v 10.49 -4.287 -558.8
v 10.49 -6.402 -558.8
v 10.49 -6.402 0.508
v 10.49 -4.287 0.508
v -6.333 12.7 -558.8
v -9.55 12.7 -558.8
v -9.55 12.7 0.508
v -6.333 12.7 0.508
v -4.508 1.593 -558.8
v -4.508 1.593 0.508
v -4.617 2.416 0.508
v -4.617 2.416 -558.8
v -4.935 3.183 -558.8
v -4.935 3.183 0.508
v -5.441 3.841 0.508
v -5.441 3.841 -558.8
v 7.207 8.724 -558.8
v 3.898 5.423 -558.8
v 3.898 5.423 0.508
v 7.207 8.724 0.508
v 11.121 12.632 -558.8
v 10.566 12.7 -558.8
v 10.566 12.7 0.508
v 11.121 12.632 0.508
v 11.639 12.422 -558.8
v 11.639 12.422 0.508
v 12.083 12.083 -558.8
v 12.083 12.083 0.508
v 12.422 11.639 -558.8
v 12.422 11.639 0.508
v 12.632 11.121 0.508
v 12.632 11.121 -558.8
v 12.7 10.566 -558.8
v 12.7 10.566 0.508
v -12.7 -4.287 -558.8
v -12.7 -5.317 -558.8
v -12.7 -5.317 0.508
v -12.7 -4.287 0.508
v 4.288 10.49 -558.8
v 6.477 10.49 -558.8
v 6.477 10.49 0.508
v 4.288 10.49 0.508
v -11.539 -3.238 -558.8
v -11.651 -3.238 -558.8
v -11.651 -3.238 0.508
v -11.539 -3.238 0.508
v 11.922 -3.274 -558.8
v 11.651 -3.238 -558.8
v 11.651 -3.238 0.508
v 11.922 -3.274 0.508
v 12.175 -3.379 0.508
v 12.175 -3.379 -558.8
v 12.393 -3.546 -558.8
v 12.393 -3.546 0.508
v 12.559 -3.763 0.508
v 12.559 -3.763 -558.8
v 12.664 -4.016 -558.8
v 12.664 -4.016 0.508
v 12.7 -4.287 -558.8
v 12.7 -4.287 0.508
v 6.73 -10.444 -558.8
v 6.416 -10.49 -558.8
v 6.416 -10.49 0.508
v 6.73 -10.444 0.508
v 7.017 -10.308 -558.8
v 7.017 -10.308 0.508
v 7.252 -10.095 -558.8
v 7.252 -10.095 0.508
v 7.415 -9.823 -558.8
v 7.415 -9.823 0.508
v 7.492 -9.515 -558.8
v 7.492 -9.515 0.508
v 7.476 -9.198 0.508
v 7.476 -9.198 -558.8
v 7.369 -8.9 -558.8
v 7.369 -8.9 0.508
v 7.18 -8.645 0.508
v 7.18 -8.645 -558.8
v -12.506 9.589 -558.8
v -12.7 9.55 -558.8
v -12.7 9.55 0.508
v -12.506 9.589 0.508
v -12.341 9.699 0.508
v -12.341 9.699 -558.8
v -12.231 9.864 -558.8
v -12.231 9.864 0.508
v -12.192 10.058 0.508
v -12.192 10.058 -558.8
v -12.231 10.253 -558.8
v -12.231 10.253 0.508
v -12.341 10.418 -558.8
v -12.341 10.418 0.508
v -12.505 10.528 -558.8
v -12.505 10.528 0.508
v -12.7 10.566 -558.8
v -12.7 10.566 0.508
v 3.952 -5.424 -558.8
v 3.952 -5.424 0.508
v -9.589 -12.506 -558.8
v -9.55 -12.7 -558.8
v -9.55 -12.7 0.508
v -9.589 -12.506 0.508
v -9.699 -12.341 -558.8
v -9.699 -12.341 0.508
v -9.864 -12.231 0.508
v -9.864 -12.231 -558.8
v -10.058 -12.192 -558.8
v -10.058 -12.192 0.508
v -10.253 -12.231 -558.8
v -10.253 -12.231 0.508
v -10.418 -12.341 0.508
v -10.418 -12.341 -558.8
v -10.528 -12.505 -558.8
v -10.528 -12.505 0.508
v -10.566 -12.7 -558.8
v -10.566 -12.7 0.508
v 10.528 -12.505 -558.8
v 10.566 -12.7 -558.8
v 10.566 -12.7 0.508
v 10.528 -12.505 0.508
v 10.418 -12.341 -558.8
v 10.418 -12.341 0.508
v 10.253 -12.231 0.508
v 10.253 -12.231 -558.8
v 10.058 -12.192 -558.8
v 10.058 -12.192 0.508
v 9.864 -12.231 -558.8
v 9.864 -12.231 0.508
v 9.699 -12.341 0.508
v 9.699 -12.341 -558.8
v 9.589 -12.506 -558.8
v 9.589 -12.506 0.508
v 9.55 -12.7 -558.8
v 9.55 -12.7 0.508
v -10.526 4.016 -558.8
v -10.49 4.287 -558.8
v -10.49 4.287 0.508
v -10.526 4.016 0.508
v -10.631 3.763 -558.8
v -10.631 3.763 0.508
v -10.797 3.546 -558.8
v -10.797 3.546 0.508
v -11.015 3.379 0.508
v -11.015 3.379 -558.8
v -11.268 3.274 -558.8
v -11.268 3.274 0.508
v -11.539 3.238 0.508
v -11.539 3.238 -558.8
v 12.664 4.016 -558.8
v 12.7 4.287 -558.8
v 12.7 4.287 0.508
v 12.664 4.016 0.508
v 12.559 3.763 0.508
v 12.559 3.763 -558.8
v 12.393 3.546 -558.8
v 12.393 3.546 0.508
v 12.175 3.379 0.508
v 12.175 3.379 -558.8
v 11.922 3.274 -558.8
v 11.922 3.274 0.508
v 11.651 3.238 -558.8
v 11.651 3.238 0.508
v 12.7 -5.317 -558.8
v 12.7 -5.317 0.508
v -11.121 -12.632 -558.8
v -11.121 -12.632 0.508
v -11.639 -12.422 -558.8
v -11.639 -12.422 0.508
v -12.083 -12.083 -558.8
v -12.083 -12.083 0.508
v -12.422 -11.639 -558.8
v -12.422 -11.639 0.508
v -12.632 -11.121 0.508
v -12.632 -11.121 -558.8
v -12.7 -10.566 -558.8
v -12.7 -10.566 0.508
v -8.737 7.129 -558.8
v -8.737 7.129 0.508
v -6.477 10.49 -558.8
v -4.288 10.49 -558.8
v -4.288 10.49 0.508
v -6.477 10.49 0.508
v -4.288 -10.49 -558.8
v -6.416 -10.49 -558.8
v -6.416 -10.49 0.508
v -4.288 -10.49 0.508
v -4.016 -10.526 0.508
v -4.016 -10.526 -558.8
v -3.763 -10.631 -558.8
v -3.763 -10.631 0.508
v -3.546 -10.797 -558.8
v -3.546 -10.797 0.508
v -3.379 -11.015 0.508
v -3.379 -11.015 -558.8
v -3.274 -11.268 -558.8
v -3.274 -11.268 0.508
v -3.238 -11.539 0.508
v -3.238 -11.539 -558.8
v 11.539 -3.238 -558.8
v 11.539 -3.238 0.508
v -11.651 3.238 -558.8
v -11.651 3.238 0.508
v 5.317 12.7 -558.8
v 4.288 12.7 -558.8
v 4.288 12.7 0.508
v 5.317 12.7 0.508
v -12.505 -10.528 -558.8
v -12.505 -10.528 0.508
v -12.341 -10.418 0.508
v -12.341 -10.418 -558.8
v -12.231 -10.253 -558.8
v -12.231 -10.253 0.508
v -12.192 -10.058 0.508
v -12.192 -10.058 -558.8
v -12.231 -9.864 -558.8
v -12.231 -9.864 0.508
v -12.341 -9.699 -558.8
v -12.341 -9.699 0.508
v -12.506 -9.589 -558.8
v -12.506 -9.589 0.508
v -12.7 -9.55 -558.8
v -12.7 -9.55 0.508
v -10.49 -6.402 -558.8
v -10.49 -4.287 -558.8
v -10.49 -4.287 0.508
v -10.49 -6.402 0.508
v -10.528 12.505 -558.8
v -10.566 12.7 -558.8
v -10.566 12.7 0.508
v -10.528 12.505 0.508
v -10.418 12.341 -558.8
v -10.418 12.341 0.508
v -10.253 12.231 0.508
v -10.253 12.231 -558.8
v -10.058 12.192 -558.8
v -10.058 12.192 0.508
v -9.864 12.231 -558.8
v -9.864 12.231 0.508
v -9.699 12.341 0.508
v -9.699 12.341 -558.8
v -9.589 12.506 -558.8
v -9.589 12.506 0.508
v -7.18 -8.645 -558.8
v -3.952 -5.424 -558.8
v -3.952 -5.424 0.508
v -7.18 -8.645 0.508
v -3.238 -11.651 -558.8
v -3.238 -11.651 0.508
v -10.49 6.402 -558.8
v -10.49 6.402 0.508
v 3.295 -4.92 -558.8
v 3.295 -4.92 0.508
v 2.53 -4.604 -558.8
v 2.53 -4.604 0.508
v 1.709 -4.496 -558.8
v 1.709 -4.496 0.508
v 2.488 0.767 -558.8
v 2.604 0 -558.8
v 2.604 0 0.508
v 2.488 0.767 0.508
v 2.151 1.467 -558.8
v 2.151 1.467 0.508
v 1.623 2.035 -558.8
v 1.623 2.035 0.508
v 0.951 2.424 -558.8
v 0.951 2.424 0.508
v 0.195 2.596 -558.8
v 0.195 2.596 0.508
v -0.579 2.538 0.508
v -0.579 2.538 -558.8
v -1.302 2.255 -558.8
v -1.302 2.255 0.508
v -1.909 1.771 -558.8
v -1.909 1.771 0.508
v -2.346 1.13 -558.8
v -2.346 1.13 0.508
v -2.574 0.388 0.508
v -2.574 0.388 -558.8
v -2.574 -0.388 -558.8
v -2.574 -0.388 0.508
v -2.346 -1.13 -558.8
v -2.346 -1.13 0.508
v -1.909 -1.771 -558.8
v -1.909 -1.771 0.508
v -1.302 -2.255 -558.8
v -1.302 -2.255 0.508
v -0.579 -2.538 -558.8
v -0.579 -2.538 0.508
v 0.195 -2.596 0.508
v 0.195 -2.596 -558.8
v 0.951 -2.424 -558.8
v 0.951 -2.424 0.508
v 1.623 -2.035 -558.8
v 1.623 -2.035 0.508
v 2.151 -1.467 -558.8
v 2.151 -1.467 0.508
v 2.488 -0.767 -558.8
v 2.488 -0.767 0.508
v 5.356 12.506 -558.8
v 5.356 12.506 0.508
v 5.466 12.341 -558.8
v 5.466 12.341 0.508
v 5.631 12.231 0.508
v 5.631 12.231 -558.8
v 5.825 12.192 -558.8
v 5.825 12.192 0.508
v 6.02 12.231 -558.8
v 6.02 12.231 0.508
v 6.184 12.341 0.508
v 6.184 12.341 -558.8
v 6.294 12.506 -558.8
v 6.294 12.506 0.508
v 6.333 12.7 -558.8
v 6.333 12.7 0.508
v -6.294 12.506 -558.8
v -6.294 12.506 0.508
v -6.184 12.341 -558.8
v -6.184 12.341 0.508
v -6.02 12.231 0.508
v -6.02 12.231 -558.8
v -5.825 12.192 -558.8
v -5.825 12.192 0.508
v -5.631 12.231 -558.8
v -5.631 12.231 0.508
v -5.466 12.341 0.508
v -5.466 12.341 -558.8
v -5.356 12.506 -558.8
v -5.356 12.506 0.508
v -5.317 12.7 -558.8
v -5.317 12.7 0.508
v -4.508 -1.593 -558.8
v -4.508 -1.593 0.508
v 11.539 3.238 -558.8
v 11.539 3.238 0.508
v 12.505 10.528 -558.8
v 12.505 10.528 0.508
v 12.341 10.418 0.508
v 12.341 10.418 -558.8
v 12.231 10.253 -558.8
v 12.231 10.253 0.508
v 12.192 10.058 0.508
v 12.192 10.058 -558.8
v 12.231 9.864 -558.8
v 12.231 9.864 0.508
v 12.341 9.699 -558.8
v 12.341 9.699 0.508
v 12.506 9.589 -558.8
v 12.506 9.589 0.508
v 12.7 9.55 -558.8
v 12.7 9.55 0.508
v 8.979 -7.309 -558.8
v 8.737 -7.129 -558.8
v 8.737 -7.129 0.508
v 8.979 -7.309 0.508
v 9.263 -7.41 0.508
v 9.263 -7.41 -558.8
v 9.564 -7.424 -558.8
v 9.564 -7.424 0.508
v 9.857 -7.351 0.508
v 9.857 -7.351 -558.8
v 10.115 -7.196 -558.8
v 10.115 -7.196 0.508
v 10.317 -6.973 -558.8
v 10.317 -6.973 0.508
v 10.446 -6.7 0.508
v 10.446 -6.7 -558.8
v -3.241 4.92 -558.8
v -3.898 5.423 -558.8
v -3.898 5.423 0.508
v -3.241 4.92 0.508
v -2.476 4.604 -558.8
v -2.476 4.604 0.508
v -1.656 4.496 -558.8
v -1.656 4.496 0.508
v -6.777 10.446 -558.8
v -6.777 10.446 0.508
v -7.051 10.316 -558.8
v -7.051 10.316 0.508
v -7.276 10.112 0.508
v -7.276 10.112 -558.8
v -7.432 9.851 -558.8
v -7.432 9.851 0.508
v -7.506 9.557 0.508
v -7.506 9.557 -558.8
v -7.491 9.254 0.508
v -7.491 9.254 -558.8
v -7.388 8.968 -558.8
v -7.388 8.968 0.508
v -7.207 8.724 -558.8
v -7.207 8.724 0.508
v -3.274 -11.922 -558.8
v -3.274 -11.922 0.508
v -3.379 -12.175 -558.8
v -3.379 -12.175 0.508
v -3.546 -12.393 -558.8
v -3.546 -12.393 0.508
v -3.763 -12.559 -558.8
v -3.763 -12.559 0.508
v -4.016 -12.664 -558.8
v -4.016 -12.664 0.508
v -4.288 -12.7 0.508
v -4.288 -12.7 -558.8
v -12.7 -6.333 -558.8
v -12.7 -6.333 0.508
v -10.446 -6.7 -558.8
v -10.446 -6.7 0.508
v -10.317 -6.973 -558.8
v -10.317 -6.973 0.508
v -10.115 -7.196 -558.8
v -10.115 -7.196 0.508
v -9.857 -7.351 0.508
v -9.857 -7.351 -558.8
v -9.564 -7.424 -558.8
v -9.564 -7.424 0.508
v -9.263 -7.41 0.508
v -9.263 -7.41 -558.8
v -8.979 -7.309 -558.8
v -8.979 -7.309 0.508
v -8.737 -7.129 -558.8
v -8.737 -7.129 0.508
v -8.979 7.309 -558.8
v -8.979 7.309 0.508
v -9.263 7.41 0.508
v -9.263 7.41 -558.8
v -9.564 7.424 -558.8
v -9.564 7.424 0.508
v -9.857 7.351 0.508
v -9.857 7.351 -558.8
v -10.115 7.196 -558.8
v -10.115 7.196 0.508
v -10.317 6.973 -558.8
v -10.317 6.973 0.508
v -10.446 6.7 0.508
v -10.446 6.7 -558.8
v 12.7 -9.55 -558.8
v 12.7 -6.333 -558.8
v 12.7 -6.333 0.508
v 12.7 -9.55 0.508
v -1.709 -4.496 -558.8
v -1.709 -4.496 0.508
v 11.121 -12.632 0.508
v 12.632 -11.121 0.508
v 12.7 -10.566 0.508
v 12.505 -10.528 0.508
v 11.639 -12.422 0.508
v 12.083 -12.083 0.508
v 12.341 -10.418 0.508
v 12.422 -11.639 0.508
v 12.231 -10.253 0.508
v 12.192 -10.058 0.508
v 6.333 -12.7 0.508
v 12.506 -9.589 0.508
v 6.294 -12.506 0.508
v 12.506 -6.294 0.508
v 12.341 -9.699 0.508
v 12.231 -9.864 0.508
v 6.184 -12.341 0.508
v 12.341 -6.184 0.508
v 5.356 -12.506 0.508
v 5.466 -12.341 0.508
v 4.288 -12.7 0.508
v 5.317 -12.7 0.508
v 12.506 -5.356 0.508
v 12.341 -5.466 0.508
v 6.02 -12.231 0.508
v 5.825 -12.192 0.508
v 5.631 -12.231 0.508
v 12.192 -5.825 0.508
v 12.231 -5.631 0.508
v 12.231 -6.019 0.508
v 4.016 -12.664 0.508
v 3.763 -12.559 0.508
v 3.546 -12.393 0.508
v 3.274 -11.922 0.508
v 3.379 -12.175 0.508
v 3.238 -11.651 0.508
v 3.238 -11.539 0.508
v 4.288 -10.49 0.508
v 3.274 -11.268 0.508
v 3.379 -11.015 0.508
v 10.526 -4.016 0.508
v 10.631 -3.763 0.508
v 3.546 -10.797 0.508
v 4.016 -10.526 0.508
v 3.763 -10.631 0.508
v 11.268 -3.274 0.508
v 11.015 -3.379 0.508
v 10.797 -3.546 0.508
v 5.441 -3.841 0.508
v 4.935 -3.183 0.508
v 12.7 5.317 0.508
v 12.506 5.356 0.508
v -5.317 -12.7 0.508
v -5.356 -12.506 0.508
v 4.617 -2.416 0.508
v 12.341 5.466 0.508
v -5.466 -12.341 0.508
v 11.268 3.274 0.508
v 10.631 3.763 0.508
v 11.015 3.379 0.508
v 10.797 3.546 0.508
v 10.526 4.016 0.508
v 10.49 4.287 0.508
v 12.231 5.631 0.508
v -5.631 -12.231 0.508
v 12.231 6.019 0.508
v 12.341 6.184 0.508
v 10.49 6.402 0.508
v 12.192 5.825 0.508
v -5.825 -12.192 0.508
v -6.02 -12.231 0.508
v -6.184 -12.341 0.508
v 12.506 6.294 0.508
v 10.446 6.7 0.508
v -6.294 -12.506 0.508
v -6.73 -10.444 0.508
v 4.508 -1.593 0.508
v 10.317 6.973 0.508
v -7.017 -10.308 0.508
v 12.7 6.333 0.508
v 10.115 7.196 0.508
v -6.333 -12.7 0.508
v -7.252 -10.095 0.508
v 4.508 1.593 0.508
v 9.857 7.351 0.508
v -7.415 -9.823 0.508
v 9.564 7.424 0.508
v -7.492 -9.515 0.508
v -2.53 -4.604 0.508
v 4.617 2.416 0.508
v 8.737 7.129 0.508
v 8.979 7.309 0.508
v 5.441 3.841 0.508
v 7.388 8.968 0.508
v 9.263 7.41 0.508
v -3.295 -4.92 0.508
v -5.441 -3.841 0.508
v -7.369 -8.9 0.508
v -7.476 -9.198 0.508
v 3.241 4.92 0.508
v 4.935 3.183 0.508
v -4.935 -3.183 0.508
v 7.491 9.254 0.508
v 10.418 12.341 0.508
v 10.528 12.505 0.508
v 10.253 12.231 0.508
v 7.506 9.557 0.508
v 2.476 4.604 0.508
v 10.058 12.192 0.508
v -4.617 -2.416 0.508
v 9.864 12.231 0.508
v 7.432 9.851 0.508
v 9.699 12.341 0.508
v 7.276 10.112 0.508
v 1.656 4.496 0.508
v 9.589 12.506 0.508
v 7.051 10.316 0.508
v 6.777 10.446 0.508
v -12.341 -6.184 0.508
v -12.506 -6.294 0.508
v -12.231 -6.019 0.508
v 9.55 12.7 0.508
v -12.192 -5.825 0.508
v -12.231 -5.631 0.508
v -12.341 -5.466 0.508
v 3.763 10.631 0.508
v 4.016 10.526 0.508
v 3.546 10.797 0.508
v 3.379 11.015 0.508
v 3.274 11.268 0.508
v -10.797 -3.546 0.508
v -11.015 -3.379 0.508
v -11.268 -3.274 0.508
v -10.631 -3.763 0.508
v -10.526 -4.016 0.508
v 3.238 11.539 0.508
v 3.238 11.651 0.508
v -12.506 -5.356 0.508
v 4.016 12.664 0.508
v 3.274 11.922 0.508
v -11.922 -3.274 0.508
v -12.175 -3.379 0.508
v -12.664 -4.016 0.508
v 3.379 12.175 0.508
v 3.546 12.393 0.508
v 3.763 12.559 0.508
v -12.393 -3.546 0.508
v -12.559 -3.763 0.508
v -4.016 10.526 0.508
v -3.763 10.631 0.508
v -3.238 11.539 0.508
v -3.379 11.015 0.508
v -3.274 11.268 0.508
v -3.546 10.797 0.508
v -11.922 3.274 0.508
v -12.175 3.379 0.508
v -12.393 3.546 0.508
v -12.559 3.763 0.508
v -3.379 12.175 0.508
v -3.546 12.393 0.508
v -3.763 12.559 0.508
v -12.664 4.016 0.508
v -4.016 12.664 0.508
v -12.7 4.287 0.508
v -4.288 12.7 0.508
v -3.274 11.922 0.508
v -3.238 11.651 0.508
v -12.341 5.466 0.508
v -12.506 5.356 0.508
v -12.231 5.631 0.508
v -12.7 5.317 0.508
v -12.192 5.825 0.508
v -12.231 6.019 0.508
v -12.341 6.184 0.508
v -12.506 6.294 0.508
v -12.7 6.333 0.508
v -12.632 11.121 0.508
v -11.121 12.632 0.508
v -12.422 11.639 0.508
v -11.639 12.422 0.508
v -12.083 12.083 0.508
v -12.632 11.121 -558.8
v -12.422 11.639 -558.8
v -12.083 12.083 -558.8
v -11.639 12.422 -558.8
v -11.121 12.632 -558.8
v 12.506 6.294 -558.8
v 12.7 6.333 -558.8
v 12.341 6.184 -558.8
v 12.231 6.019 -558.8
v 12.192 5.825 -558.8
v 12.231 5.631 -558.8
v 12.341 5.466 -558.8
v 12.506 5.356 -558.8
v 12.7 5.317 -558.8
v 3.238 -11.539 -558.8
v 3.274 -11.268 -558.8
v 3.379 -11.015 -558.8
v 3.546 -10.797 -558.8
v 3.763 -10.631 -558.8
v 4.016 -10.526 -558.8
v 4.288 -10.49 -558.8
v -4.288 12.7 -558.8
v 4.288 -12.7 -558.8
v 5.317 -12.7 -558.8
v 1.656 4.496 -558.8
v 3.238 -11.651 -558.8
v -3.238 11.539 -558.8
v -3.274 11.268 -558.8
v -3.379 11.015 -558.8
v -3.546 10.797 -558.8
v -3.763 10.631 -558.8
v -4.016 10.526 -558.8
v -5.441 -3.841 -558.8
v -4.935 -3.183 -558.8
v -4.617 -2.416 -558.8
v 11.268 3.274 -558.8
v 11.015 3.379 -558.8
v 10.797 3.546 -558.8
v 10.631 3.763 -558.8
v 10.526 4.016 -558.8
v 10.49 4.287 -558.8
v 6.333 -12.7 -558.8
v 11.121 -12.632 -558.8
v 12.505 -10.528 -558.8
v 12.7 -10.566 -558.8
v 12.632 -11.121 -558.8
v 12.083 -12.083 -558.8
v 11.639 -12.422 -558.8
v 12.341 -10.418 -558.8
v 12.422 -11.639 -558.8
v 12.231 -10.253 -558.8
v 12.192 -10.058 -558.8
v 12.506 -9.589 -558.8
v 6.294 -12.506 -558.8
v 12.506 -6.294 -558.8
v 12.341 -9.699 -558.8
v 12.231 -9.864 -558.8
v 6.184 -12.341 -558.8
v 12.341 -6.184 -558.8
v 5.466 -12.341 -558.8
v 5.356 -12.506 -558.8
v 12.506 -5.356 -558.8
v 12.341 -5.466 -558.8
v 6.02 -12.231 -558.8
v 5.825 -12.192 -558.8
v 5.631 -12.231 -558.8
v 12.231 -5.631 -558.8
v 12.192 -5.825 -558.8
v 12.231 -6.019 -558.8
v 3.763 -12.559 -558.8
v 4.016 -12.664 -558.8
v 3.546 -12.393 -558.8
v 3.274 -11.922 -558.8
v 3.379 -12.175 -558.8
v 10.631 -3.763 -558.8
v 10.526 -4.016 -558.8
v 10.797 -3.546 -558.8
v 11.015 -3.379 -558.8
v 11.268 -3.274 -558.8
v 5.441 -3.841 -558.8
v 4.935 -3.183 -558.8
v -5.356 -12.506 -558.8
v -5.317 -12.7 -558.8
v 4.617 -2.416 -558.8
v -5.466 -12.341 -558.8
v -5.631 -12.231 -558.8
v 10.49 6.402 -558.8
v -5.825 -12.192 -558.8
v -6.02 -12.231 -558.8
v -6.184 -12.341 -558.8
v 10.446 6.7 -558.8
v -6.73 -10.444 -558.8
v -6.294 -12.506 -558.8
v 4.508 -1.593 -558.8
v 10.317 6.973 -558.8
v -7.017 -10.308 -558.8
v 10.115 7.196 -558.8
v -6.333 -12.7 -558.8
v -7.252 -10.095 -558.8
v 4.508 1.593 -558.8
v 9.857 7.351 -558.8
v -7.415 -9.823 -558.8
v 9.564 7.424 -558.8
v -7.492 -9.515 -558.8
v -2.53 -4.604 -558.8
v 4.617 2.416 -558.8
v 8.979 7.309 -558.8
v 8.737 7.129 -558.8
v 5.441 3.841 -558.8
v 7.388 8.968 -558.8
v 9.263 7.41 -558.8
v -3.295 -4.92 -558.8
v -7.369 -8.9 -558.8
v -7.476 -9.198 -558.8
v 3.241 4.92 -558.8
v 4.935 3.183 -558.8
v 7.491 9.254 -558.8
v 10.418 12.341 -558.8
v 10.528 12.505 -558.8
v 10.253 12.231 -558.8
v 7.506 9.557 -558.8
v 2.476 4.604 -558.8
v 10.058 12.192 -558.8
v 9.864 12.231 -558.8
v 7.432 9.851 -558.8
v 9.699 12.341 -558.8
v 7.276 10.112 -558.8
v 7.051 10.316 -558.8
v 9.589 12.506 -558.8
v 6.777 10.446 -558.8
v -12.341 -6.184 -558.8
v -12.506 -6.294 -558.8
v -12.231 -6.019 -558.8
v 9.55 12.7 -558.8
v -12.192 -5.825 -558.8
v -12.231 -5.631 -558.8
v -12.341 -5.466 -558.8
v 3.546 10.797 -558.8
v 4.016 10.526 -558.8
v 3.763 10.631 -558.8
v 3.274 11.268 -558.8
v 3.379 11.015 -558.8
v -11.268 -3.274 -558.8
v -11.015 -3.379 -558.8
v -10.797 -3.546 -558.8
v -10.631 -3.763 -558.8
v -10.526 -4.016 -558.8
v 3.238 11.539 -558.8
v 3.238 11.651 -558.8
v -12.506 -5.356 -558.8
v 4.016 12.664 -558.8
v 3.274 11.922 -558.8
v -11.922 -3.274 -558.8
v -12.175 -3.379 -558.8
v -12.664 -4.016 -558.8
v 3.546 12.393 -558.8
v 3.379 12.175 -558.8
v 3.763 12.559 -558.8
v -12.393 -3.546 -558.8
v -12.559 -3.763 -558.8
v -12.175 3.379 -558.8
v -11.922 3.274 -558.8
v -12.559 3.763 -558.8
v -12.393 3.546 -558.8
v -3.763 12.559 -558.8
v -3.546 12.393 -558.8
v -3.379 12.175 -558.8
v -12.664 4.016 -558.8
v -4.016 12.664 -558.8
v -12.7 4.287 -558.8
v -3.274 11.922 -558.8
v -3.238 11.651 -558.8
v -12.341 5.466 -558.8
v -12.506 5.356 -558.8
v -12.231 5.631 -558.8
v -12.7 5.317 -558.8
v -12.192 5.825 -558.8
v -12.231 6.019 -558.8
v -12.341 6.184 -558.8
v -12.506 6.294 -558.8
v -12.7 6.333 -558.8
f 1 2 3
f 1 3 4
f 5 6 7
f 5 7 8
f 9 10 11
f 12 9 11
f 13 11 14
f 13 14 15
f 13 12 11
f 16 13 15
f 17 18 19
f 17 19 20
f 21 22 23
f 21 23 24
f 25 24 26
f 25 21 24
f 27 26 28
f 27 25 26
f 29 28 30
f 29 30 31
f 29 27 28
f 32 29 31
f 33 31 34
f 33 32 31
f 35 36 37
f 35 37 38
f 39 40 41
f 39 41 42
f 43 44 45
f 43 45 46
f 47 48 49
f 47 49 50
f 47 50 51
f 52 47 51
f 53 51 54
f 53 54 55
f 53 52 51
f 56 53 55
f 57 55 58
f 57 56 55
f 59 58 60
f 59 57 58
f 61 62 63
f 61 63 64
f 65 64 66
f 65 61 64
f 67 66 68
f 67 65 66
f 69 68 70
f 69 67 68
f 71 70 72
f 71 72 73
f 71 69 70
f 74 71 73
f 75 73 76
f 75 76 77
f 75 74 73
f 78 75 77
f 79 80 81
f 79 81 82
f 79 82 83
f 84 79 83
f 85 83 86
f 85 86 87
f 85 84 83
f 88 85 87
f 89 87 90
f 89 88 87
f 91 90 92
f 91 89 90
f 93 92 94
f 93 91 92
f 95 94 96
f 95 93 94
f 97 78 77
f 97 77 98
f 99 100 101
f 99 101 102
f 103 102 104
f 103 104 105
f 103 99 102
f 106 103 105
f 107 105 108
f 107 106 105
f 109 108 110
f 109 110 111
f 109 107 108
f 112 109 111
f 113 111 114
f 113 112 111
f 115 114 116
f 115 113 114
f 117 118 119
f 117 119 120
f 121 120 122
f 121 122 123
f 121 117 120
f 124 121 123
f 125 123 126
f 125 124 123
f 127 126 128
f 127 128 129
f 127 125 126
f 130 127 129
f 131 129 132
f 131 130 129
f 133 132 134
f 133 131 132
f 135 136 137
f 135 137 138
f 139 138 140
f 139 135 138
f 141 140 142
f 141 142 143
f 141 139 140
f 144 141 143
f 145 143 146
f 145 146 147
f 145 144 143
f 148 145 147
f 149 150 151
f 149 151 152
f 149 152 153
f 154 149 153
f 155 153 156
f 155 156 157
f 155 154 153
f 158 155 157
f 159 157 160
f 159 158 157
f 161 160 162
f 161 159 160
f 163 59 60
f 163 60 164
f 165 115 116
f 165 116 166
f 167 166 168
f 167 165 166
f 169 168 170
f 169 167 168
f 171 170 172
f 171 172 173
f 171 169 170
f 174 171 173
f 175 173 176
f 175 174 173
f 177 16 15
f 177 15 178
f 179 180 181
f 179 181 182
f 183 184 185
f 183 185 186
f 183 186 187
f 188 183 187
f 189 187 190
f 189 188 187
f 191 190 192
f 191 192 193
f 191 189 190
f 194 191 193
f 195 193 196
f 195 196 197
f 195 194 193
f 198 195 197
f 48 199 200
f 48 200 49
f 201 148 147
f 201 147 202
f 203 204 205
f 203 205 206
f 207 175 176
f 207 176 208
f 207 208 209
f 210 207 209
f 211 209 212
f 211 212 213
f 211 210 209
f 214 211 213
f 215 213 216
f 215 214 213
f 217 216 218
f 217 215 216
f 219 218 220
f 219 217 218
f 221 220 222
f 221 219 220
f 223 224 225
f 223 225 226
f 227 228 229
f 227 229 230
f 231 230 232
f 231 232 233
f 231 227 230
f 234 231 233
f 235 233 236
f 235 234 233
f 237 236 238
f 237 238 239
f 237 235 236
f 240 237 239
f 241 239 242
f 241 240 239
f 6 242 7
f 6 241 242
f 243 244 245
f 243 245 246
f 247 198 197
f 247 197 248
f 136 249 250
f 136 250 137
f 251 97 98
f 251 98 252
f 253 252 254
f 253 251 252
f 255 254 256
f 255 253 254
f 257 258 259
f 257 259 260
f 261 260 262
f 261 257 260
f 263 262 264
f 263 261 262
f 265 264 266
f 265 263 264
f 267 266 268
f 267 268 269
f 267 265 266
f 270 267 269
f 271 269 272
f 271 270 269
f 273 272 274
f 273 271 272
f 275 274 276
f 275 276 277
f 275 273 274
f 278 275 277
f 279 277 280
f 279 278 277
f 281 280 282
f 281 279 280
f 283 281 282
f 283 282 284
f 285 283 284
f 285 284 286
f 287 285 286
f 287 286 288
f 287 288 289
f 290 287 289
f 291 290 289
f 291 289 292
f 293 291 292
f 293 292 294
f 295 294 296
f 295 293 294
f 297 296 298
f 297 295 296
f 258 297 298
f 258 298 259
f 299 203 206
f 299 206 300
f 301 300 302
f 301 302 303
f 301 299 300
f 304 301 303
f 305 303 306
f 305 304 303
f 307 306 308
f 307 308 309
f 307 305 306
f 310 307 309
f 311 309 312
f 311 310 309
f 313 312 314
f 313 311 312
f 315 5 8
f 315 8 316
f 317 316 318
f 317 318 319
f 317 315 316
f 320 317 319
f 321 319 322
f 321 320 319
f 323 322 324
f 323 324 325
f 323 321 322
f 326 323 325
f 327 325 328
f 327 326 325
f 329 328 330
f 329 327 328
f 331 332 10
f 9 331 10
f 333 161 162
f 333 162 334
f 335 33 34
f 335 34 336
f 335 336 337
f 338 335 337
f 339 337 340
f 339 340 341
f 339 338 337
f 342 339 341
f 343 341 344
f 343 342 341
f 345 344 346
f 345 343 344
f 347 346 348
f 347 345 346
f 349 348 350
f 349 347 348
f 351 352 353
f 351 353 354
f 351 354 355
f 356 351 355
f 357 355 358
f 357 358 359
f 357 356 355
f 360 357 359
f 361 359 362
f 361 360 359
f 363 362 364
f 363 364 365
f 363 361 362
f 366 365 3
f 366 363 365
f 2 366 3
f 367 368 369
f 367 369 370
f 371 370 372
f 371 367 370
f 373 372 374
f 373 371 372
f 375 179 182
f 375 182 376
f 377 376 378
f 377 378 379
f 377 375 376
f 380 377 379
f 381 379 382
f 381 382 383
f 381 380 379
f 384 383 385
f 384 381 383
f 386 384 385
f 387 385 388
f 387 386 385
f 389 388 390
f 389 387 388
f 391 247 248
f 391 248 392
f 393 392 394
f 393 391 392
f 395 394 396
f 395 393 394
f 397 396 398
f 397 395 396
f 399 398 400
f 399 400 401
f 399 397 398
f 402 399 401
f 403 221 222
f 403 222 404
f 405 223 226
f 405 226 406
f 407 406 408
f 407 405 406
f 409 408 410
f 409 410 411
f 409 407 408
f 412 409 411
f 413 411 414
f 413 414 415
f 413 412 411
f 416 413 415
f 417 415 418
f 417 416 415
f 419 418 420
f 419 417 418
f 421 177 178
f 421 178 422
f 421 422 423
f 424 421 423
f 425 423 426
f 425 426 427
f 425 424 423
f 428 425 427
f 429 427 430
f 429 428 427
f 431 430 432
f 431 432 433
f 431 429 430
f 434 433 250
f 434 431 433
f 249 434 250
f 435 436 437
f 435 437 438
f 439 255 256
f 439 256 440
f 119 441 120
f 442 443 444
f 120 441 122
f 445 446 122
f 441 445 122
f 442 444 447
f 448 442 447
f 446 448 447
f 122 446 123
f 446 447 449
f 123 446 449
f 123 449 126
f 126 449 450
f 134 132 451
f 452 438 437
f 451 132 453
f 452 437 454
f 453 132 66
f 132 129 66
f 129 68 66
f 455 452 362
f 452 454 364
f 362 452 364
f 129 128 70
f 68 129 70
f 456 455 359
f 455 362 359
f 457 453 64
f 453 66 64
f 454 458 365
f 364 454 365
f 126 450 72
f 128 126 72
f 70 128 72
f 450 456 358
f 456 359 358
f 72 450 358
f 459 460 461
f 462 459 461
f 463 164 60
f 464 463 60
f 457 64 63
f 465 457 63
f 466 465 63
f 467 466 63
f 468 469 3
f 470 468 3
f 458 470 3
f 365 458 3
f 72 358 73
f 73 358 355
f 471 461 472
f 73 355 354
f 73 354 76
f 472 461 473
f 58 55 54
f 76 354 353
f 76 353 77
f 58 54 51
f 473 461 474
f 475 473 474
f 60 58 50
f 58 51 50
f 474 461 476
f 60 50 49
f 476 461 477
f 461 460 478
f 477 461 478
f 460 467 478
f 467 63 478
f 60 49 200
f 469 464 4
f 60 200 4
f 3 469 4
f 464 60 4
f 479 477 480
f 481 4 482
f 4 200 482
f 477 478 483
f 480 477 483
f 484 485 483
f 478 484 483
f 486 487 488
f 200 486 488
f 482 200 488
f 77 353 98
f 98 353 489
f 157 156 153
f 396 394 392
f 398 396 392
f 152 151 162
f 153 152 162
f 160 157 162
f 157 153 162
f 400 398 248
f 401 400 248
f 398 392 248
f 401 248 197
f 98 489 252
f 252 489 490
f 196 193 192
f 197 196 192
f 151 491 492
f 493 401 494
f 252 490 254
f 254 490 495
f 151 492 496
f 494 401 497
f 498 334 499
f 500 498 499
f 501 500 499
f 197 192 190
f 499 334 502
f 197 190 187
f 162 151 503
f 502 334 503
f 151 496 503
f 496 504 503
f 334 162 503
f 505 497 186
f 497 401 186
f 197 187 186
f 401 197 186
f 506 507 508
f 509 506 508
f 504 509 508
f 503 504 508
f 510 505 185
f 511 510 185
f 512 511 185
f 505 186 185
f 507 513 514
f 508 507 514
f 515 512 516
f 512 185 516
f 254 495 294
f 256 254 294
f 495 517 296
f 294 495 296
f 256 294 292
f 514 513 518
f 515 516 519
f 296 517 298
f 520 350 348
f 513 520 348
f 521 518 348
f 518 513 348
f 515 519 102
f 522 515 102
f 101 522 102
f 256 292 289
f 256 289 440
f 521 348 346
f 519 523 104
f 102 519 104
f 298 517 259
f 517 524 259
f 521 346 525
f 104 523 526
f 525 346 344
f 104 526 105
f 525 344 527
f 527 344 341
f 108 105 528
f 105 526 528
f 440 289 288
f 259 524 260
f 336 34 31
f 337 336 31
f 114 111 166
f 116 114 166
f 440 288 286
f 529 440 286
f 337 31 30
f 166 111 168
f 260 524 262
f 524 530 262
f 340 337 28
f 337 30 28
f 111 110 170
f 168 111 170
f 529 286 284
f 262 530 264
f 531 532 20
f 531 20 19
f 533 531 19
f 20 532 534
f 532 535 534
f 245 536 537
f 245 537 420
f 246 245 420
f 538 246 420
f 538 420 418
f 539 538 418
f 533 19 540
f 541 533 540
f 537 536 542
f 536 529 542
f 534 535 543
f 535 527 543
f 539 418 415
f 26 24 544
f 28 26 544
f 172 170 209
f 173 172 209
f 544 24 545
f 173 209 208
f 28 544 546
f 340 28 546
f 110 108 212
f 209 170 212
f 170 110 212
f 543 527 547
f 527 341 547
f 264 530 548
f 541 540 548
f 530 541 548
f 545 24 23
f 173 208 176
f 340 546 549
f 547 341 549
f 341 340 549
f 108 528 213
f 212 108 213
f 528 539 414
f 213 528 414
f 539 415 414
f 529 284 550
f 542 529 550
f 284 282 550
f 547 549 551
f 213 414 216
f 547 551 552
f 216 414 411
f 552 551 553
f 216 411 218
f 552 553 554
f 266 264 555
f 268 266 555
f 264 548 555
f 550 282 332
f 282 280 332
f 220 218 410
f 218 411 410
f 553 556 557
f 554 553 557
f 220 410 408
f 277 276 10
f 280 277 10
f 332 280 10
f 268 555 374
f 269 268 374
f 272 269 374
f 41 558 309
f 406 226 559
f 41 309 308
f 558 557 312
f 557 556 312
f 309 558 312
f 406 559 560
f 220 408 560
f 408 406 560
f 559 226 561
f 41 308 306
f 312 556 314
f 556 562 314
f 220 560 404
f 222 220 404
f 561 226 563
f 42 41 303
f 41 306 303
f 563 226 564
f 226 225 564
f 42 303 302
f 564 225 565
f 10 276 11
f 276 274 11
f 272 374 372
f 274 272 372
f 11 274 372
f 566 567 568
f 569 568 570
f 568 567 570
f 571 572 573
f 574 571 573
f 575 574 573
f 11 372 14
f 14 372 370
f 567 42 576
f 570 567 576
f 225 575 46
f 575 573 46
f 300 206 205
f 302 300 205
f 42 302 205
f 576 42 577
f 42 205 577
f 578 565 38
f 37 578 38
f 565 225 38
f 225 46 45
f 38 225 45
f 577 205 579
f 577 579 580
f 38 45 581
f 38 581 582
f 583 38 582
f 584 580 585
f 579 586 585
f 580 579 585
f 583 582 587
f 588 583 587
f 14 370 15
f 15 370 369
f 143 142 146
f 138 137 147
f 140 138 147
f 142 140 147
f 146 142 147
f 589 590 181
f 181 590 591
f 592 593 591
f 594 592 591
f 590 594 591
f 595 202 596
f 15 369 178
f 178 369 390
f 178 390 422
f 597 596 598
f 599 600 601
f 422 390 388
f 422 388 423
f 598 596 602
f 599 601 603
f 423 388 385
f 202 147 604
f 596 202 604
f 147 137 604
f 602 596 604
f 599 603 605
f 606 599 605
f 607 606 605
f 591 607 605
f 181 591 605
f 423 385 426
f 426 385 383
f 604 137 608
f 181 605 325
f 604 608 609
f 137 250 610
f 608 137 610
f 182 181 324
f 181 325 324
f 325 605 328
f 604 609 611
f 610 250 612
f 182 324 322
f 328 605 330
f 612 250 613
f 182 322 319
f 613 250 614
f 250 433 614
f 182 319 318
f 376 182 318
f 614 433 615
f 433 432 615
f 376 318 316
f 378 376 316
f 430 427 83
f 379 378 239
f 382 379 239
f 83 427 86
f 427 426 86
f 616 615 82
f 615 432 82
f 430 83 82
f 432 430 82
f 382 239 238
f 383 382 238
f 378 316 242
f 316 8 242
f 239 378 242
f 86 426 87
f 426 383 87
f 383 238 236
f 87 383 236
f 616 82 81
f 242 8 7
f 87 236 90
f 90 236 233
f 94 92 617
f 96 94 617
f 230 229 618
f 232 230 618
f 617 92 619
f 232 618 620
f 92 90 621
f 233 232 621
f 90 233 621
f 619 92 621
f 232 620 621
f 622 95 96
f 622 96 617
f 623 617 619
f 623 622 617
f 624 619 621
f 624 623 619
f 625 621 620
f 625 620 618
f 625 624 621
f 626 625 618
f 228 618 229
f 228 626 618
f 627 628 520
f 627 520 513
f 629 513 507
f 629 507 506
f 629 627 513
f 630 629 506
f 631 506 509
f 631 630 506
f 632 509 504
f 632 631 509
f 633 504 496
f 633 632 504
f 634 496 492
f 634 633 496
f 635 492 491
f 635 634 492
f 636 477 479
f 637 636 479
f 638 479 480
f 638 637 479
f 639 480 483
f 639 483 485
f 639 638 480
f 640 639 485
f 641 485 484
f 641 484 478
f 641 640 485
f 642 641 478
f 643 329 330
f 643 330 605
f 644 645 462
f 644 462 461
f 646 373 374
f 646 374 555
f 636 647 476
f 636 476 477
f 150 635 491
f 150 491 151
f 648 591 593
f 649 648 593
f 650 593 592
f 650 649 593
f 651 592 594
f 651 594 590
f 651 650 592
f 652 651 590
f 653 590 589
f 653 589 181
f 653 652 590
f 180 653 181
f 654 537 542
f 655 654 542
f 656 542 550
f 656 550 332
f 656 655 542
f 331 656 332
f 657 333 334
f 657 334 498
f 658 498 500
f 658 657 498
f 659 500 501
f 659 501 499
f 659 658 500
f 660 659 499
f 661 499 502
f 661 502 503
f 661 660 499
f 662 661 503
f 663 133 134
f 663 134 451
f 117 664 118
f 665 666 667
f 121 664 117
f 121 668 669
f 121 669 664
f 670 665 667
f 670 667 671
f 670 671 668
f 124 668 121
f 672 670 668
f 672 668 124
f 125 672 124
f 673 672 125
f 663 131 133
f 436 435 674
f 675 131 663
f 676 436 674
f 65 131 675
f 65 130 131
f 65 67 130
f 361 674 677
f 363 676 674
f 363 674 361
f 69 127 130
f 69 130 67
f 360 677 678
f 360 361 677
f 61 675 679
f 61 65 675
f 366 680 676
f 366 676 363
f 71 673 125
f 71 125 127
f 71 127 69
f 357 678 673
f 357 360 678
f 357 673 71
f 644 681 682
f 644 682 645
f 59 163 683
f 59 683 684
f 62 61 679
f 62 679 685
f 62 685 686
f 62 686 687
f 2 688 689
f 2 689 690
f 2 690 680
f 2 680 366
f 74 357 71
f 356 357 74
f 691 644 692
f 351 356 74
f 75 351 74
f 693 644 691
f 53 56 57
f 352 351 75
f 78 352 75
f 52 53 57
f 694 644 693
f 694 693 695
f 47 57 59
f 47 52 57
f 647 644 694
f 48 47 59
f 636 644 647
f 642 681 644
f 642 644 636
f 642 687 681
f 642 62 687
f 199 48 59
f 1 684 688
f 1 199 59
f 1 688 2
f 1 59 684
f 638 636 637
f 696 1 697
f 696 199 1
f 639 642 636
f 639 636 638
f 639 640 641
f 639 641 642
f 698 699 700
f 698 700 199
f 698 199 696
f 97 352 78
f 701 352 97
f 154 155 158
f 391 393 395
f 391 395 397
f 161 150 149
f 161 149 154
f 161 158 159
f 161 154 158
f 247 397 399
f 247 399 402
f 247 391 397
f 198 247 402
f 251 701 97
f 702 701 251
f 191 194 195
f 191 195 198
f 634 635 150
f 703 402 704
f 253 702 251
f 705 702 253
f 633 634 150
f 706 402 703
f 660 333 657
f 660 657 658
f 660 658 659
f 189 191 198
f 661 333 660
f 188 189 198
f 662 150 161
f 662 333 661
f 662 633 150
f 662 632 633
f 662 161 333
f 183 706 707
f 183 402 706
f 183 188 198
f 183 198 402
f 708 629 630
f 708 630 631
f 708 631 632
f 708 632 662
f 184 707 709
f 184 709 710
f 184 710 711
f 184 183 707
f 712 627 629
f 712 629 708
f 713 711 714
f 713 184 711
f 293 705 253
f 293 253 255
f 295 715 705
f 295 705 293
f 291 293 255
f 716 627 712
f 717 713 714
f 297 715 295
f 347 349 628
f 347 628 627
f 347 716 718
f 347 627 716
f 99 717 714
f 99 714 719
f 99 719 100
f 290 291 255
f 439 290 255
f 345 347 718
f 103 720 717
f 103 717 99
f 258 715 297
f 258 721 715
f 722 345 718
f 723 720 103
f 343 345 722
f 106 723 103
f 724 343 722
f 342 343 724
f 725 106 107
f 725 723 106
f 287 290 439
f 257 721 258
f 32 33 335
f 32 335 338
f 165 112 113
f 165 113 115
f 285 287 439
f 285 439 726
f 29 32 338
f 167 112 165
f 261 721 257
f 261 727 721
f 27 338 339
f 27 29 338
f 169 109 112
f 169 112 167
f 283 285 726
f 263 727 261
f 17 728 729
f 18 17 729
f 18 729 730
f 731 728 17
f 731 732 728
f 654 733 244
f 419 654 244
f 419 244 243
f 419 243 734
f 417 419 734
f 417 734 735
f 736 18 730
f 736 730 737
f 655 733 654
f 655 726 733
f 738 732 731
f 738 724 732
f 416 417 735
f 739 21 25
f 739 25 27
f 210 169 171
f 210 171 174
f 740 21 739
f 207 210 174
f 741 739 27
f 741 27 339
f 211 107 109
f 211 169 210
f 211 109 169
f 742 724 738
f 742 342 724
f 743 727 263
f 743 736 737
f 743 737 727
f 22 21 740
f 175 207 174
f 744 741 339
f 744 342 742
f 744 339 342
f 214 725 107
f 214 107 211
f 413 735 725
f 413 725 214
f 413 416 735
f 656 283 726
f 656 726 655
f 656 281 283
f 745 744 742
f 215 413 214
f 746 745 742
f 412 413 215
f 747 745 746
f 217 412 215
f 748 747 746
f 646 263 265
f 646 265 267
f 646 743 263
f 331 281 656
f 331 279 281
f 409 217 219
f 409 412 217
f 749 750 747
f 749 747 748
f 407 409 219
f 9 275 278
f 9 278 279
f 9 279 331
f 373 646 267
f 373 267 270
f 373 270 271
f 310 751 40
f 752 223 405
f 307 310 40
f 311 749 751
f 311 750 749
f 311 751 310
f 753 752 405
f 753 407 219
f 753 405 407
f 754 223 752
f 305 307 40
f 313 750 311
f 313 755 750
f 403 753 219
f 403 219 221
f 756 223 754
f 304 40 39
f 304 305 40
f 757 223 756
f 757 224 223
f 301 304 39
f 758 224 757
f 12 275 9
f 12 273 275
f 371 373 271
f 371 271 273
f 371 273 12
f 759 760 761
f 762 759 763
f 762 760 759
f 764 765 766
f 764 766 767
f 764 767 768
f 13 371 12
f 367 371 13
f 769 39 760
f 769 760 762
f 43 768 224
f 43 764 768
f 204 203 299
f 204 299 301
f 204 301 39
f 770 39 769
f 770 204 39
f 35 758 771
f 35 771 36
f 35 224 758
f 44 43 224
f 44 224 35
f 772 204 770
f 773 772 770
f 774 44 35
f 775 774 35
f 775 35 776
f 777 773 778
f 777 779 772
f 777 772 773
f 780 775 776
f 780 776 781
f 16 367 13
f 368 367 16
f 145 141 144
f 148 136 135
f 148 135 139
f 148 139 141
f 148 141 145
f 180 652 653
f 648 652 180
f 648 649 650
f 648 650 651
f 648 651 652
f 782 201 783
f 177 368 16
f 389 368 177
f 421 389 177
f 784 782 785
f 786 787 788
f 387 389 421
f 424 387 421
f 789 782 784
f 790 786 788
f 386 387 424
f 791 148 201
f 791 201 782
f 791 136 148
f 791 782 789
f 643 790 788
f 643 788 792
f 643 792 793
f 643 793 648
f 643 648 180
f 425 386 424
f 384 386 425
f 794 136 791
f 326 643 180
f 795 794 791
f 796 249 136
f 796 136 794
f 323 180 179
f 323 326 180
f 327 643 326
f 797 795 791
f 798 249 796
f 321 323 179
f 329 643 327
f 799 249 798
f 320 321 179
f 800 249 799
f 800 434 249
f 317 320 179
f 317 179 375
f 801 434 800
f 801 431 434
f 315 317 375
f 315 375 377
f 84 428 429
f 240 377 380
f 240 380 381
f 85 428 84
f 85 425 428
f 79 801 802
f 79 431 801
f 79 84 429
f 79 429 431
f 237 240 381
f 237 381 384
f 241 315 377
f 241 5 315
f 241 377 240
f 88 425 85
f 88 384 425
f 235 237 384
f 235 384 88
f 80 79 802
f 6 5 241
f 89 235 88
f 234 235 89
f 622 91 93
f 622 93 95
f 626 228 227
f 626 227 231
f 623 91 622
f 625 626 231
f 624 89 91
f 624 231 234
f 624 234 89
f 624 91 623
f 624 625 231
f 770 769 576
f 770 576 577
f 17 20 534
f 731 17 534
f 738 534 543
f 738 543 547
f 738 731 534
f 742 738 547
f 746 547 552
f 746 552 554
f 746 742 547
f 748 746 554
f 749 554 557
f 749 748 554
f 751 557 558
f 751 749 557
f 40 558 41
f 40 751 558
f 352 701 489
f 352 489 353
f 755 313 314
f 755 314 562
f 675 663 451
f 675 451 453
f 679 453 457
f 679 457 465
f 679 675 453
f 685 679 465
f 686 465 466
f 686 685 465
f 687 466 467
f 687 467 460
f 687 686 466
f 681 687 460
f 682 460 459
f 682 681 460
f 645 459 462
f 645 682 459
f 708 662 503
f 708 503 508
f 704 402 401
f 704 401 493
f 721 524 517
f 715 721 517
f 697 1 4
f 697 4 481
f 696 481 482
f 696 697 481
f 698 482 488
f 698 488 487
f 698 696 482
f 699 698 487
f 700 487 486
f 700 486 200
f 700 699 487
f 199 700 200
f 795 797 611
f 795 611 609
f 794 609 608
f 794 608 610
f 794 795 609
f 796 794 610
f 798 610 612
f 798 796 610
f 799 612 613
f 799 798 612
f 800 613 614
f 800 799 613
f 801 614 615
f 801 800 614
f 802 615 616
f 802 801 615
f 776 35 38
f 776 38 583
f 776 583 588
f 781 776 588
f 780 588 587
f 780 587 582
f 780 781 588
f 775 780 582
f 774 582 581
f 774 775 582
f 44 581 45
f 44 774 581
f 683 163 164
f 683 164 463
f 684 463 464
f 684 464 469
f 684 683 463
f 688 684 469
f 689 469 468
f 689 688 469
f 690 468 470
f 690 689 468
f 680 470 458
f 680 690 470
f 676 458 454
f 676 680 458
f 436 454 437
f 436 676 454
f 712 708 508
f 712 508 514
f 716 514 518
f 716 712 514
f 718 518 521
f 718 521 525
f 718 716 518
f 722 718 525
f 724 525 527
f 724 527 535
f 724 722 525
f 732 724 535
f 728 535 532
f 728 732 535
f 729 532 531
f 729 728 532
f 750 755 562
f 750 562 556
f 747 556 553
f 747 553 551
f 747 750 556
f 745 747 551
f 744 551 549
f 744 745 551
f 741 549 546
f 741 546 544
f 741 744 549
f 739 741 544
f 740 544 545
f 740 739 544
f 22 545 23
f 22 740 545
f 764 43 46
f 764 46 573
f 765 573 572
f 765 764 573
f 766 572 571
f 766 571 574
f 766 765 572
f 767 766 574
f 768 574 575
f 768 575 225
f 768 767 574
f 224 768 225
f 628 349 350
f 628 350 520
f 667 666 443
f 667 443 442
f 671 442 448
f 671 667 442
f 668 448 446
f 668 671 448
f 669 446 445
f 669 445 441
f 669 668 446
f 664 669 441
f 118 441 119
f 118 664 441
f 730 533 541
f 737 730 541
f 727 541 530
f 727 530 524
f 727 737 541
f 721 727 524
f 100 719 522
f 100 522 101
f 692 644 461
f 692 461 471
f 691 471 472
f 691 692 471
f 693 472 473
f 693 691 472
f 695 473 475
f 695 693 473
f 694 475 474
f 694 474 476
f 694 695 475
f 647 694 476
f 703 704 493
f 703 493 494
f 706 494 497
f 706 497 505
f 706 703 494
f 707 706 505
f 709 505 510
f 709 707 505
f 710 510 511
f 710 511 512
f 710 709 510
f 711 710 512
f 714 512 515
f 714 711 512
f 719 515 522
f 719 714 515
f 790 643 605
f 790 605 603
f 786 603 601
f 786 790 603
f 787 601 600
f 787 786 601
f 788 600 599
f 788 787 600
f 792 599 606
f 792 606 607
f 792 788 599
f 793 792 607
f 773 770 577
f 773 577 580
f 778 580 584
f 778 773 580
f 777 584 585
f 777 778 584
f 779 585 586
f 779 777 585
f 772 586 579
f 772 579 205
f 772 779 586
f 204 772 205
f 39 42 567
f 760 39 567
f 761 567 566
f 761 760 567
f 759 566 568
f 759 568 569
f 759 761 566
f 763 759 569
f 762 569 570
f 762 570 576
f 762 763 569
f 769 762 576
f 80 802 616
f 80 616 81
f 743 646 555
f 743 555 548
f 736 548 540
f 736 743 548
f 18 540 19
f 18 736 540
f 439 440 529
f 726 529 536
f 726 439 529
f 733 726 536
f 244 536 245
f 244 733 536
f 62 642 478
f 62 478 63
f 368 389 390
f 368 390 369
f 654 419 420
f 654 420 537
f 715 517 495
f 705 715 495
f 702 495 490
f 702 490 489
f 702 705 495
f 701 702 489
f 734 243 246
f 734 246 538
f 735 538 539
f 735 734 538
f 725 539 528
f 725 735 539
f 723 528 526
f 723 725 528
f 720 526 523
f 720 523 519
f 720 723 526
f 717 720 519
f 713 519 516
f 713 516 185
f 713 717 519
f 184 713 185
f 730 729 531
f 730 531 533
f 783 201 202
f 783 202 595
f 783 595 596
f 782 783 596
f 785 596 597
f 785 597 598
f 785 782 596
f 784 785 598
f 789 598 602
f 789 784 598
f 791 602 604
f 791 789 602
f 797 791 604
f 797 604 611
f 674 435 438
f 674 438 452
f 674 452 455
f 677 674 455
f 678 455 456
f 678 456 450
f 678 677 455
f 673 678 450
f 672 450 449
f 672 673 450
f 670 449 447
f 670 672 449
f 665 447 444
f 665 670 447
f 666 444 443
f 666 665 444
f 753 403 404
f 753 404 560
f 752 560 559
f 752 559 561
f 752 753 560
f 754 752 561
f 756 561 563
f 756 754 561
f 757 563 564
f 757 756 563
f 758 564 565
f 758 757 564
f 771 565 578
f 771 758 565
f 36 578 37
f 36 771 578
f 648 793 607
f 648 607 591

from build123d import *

# Parameters (mm, degrees)
EXTRUDE1_DEPTH      = 0.508
EXTRUDE1_DEPTH_BACK = 558.8
SKETCH1_R           = 2.6035


with BuildPart() as part:
    # Sketch1 → Extrude1 (new, two sides: drawn at the far end of the back side and taken through both)
    with BuildSketch(Plane.XY.offset(-EXTRUDE1_DEPTH_BACK)):
        with BuildLine():
            Line((-7.207036008, 8.724370562), (-3.898272566, 5.423169045))
            ThreePointArc((-3.898272566, 5.423169045), (-2.869120213, 4.736787962), (-1.655778399, 4.4958))
            Line((-1.655778399, 4.4958), (1.655778399, 4.4958))
            ThreePointArc((1.655778399, 4.4958), (2.869120213, 4.736787962), (3.898272566, 5.423169045))
            Line((3.898272566, 5.423169045), (7.207036008, 8.724370562))
            ThreePointArc((7.207036008, 8.724370562), (7.432222385, 9.85140422), (6.476788598, 10.4902))
            Line((6.476788598, 10.4902), (4.287512407, 10.4902))
            ThreePointArc((4.287512407, 10.4902), (3.54574862, 10.79744862), (3.2385, 11.539212407))
            Line((3.2385, 11.539212407), (3.2385, 11.650987593))
            ThreePointArc((3.2385, 11.650987593), (3.54574862, 12.39275138), (4.287512407, 12.7))
            Line((4.287512407, 12.7), (5.317126718, 12.7))
            ThreePointArc((5.317126718, 12.7), (5.825126718, 12.192), (6.333126718, 12.7))
            Line((6.333126718, 12.7), (9.550443118, 12.7))
            ThreePointArc((9.550443118, 12.7), (10.058366869, 12.192000006), (10.566443095, 12.699847501))
            ThreePointArc((10.566443095, 12.699847501), (12.082537762, 12.08250727), (12.699846982, 10.566399977))
            ThreePointArc((12.699846982, 10.566399977), (12.192000006, 10.058323491), (12.7, 9.5504))
            Line((12.7, 9.5504), (12.7, 6.3330836))
            ThreePointArc((12.7, 6.3330836), (12.192, 5.8250836), (12.7, 5.3170836))
            Line((12.7, 5.3170836), (12.7, 4.287469289))
            ThreePointArc((12.7, 4.287469289), (12.39275138, 3.545705502), (11.650987593, 3.238456882))
            Line((11.650987593, 3.238456882), (11.539212407, 3.238456882))
            ThreePointArc((11.539212407, 3.238456882), (10.79744862, 3.545705502), (10.4902, 4.287469289))
            Line((10.4902, 4.287469289), (10.4902, 6.402089023))
            ThreePointArc((10.4902, 6.402089023), (9.856505071, 7.351067942), (8.737131347, 7.129408934))
            Line((8.737131347, 7.129408934), (5.441005833, 3.840816462))
            ThreePointArc((5.441005833, 3.840816462), (4.750877967, 2.809883091), (4.5085, 1.593185507))
            Line((4.5085, 1.593185507), (4.5085, -1.593185507))
            ThreePointArc((4.5085, -1.593185507), (4.750877967, -2.809883091), (5.441005833, -3.840816462))
            Line((5.441005833, -3.840816462), (8.737131347, -7.129408934))
            ThreePointArc((8.737131347, -7.129408934), (9.856505071, -7.351067942), (10.4902, -6.402089023))
            Line((10.4902, -6.402089023), (10.4902, -4.287469289))
            ThreePointArc((10.4902, -4.287469289), (10.79744862, -3.545705502), (11.539212407, -3.238456882))
            Line((11.539212407, -3.238456882), (11.650987593, -3.238456882))
            ThreePointArc((11.650987593, -3.238456882), (12.39275138, -3.545705502), (12.7, -4.287469289))
            Line((12.7, -4.287469289), (12.7, -5.3170836))
            ThreePointArc((12.7, -5.3170836), (12.192, -5.8250836), (12.7, -6.3330836))
            Line((12.7, -6.3330836), (12.7, -9.5504))
            ThreePointArc((12.7, -9.5504), (12.192000006, -10.058323491), (12.699846982, -10.566399977))
            ThreePointArc((12.699846982, -10.566399977), (12.082537762, -12.08250727), (10.566443095, -12.699847501))
            ThreePointArc((10.566443095, -12.699847501), (10.058366869, -12.192000006), (9.550443118, -12.7))
            Line((9.550443118, -12.7), (6.333126718, -12.7))
            ThreePointArc((6.333126718, -12.7), (5.825126718, -12.192), (5.317126718, -12.7))
            Line((5.317126718, -12.7), (4.287512407, -12.7))
            ThreePointArc((4.287512407, -12.7), (3.54574862, -12.39275138), (3.2385, -11.650987593))
            Line((3.2385, -11.650987593), (3.2385, -11.539212407))
            ThreePointArc((3.2385, -11.539212407), (3.54574862, -10.79744862), (4.287512407, -10.4902))
            Line((4.287512407, -10.4902), (6.416408329, -10.4902))
            ThreePointArc((6.416408329, -10.4902), (7.41473083, -9.822813117), (7.179650497, -8.645192506))
            Line((7.179650497, -8.645192506), (3.952270251, -5.423690499))
            ThreePointArc((3.952270251, -5.423690499), (2.922936451, -4.736929036), (1.709253557, -4.4958))
            Line((1.709253557, -4.4958), (-1.709253557, -4.4958))
            ThreePointArc((-1.709253557, -4.4958), (-2.922936451, -4.736929036), (-3.952270251, -5.423690499))
            Line((-3.952270251, -5.423690499), (-7.179650497, -8.645192506))
            ThreePointArc((-7.179650497, -8.645192506), (-7.41473083, -9.822813117), (-6.416408329, -10.4902))
            Line((-6.416408329, -10.4902), (-4.287512407, -10.4902))
            ThreePointArc((-4.287512407, -10.4902), (-3.54574862, -10.79744862), (-3.2385, -11.539212407))
            Line((-3.2385, -11.539212407), (-3.2385, -11.650987593))
            ThreePointArc((-3.2385, -11.650987593), (-3.54574862, -12.39275138), (-4.287512407, -12.7))
            Line((-4.287512407, -12.7), (-5.317126718, -12.7))
            ThreePointArc((-5.317126718, -12.7), (-5.825126718, -12.192), (-6.333126718, -12.7))
            Line((-6.333126718, -12.7), (-9.550443118, -12.7))
            ThreePointArc((-9.550443118, -12.7), (-10.058366869, -12.192000006), (-10.566443095, -12.699847501))
            ThreePointArc((-10.566443095, -12.699847501), (-12.082537762, -12.08250727), (-12.699846982, -10.566399977))
            ThreePointArc((-12.699846982, -10.566399977), (-12.192000006, -10.058323491), (-12.7, -9.5504))
            Line((-12.7, -9.5504), (-12.7, -6.3330836))
            ThreePointArc((-12.7, -6.3330836), (-12.192, -5.8250836), (-12.7, -5.3170836))
            Line((-12.7, -5.3170836), (-12.7, -4.287469289))
            ThreePointArc((-12.7, -4.287469289), (-12.39275138, -3.545705502), (-11.650987593, -3.238456882))
            Line((-11.650987593, -3.238456882), (-11.539212407, -3.238456882))
            ThreePointArc((-11.539212407, -3.238456882), (-10.79744862, -3.545705502), (-10.4902, -4.287469289))
            Line((-10.4902, -4.287469289), (-10.4902, -6.402089023))
            ThreePointArc((-10.4902, -6.402089023), (-9.856505071, -7.351067942), (-8.737131347, -7.129408934))
            Line((-8.737131347, -7.129408934), (-5.441005833, -3.840816462))
            ThreePointArc((-5.441005833, -3.840816462), (-4.750877967, -2.809883091), (-4.5085, -1.593185507))
            Line((-4.5085, -1.593185507), (-4.5085, 1.593185507))
            ThreePointArc((-4.5085, 1.593185507), (-4.750877967, 2.809883091), (-5.441005833, 3.840816462))
            Line((-5.441005833, 3.840816462), (-8.737131347, 7.129408934))
            ThreePointArc((-8.737131347, 7.129408934), (-9.856505071, 7.351067942), (-10.4902, 6.402089023))
            Line((-10.4902, 6.402089023), (-10.4902, 4.287469289))
            ThreePointArc((-10.4902, 4.287469289), (-10.79744862, 3.545705502), (-11.539212407, 3.238456882))
            Line((-11.539212407, 3.238456882), (-11.650987593, 3.238456882))
            ThreePointArc((-11.650987593, 3.238456882), (-12.39275138, 3.545705502), (-12.7, 4.287469289))
            Line((-12.7, 4.287469289), (-12.7, 5.3170836))
            ThreePointArc((-12.7, 5.3170836), (-12.192, 5.8250836), (-12.7, 6.3330836))
            Line((-12.7, 6.3330836), (-12.7, 9.5504))
            ThreePointArc((-12.7, 9.5504), (-12.192000006, 10.058323491), (-12.699846982, 10.566399977))
            ThreePointArc((-12.699846982, 10.566399977), (-12.082537762, 12.08250727), (-10.566443095, 12.699847501))
            ThreePointArc((-10.566443095, 12.699847501), (-10.058366869, 12.192000006), (-9.550443118, 12.7))
            Line((-9.550443118, 12.7), (-6.333126718, 12.7))
            ThreePointArc((-6.333126718, 12.7), (-5.825126718, 12.192), (-5.317126718, 12.7))
            Line((-5.317126718, 12.7), (-4.287512407, 12.7))
            ThreePointArc((-4.287512407, 12.7), (-3.54574862, 12.39275138), (-3.2385, 11.650987593))
            Line((-3.2385, 11.650987593), (-3.2385, 11.539212407))
            ThreePointArc((-3.2385, 11.539212407), (-3.54574862, 10.79744862), (-4.287512407, 10.4902))
            Line((-4.287512407, 10.4902), (-6.476788598, 10.4902))
            ThreePointArc((-6.476788598, 10.4902), (-7.432222385, 9.85140422), (-7.207036008, 8.724370562))
        make_face()
        Circle(SKETCH1_R, mode=Mode.SUBTRACT)
    extrude(amount=EXTRUDE1_DEPTH + EXTRUDE1_DEPTH_BACK)


solid = part.part
